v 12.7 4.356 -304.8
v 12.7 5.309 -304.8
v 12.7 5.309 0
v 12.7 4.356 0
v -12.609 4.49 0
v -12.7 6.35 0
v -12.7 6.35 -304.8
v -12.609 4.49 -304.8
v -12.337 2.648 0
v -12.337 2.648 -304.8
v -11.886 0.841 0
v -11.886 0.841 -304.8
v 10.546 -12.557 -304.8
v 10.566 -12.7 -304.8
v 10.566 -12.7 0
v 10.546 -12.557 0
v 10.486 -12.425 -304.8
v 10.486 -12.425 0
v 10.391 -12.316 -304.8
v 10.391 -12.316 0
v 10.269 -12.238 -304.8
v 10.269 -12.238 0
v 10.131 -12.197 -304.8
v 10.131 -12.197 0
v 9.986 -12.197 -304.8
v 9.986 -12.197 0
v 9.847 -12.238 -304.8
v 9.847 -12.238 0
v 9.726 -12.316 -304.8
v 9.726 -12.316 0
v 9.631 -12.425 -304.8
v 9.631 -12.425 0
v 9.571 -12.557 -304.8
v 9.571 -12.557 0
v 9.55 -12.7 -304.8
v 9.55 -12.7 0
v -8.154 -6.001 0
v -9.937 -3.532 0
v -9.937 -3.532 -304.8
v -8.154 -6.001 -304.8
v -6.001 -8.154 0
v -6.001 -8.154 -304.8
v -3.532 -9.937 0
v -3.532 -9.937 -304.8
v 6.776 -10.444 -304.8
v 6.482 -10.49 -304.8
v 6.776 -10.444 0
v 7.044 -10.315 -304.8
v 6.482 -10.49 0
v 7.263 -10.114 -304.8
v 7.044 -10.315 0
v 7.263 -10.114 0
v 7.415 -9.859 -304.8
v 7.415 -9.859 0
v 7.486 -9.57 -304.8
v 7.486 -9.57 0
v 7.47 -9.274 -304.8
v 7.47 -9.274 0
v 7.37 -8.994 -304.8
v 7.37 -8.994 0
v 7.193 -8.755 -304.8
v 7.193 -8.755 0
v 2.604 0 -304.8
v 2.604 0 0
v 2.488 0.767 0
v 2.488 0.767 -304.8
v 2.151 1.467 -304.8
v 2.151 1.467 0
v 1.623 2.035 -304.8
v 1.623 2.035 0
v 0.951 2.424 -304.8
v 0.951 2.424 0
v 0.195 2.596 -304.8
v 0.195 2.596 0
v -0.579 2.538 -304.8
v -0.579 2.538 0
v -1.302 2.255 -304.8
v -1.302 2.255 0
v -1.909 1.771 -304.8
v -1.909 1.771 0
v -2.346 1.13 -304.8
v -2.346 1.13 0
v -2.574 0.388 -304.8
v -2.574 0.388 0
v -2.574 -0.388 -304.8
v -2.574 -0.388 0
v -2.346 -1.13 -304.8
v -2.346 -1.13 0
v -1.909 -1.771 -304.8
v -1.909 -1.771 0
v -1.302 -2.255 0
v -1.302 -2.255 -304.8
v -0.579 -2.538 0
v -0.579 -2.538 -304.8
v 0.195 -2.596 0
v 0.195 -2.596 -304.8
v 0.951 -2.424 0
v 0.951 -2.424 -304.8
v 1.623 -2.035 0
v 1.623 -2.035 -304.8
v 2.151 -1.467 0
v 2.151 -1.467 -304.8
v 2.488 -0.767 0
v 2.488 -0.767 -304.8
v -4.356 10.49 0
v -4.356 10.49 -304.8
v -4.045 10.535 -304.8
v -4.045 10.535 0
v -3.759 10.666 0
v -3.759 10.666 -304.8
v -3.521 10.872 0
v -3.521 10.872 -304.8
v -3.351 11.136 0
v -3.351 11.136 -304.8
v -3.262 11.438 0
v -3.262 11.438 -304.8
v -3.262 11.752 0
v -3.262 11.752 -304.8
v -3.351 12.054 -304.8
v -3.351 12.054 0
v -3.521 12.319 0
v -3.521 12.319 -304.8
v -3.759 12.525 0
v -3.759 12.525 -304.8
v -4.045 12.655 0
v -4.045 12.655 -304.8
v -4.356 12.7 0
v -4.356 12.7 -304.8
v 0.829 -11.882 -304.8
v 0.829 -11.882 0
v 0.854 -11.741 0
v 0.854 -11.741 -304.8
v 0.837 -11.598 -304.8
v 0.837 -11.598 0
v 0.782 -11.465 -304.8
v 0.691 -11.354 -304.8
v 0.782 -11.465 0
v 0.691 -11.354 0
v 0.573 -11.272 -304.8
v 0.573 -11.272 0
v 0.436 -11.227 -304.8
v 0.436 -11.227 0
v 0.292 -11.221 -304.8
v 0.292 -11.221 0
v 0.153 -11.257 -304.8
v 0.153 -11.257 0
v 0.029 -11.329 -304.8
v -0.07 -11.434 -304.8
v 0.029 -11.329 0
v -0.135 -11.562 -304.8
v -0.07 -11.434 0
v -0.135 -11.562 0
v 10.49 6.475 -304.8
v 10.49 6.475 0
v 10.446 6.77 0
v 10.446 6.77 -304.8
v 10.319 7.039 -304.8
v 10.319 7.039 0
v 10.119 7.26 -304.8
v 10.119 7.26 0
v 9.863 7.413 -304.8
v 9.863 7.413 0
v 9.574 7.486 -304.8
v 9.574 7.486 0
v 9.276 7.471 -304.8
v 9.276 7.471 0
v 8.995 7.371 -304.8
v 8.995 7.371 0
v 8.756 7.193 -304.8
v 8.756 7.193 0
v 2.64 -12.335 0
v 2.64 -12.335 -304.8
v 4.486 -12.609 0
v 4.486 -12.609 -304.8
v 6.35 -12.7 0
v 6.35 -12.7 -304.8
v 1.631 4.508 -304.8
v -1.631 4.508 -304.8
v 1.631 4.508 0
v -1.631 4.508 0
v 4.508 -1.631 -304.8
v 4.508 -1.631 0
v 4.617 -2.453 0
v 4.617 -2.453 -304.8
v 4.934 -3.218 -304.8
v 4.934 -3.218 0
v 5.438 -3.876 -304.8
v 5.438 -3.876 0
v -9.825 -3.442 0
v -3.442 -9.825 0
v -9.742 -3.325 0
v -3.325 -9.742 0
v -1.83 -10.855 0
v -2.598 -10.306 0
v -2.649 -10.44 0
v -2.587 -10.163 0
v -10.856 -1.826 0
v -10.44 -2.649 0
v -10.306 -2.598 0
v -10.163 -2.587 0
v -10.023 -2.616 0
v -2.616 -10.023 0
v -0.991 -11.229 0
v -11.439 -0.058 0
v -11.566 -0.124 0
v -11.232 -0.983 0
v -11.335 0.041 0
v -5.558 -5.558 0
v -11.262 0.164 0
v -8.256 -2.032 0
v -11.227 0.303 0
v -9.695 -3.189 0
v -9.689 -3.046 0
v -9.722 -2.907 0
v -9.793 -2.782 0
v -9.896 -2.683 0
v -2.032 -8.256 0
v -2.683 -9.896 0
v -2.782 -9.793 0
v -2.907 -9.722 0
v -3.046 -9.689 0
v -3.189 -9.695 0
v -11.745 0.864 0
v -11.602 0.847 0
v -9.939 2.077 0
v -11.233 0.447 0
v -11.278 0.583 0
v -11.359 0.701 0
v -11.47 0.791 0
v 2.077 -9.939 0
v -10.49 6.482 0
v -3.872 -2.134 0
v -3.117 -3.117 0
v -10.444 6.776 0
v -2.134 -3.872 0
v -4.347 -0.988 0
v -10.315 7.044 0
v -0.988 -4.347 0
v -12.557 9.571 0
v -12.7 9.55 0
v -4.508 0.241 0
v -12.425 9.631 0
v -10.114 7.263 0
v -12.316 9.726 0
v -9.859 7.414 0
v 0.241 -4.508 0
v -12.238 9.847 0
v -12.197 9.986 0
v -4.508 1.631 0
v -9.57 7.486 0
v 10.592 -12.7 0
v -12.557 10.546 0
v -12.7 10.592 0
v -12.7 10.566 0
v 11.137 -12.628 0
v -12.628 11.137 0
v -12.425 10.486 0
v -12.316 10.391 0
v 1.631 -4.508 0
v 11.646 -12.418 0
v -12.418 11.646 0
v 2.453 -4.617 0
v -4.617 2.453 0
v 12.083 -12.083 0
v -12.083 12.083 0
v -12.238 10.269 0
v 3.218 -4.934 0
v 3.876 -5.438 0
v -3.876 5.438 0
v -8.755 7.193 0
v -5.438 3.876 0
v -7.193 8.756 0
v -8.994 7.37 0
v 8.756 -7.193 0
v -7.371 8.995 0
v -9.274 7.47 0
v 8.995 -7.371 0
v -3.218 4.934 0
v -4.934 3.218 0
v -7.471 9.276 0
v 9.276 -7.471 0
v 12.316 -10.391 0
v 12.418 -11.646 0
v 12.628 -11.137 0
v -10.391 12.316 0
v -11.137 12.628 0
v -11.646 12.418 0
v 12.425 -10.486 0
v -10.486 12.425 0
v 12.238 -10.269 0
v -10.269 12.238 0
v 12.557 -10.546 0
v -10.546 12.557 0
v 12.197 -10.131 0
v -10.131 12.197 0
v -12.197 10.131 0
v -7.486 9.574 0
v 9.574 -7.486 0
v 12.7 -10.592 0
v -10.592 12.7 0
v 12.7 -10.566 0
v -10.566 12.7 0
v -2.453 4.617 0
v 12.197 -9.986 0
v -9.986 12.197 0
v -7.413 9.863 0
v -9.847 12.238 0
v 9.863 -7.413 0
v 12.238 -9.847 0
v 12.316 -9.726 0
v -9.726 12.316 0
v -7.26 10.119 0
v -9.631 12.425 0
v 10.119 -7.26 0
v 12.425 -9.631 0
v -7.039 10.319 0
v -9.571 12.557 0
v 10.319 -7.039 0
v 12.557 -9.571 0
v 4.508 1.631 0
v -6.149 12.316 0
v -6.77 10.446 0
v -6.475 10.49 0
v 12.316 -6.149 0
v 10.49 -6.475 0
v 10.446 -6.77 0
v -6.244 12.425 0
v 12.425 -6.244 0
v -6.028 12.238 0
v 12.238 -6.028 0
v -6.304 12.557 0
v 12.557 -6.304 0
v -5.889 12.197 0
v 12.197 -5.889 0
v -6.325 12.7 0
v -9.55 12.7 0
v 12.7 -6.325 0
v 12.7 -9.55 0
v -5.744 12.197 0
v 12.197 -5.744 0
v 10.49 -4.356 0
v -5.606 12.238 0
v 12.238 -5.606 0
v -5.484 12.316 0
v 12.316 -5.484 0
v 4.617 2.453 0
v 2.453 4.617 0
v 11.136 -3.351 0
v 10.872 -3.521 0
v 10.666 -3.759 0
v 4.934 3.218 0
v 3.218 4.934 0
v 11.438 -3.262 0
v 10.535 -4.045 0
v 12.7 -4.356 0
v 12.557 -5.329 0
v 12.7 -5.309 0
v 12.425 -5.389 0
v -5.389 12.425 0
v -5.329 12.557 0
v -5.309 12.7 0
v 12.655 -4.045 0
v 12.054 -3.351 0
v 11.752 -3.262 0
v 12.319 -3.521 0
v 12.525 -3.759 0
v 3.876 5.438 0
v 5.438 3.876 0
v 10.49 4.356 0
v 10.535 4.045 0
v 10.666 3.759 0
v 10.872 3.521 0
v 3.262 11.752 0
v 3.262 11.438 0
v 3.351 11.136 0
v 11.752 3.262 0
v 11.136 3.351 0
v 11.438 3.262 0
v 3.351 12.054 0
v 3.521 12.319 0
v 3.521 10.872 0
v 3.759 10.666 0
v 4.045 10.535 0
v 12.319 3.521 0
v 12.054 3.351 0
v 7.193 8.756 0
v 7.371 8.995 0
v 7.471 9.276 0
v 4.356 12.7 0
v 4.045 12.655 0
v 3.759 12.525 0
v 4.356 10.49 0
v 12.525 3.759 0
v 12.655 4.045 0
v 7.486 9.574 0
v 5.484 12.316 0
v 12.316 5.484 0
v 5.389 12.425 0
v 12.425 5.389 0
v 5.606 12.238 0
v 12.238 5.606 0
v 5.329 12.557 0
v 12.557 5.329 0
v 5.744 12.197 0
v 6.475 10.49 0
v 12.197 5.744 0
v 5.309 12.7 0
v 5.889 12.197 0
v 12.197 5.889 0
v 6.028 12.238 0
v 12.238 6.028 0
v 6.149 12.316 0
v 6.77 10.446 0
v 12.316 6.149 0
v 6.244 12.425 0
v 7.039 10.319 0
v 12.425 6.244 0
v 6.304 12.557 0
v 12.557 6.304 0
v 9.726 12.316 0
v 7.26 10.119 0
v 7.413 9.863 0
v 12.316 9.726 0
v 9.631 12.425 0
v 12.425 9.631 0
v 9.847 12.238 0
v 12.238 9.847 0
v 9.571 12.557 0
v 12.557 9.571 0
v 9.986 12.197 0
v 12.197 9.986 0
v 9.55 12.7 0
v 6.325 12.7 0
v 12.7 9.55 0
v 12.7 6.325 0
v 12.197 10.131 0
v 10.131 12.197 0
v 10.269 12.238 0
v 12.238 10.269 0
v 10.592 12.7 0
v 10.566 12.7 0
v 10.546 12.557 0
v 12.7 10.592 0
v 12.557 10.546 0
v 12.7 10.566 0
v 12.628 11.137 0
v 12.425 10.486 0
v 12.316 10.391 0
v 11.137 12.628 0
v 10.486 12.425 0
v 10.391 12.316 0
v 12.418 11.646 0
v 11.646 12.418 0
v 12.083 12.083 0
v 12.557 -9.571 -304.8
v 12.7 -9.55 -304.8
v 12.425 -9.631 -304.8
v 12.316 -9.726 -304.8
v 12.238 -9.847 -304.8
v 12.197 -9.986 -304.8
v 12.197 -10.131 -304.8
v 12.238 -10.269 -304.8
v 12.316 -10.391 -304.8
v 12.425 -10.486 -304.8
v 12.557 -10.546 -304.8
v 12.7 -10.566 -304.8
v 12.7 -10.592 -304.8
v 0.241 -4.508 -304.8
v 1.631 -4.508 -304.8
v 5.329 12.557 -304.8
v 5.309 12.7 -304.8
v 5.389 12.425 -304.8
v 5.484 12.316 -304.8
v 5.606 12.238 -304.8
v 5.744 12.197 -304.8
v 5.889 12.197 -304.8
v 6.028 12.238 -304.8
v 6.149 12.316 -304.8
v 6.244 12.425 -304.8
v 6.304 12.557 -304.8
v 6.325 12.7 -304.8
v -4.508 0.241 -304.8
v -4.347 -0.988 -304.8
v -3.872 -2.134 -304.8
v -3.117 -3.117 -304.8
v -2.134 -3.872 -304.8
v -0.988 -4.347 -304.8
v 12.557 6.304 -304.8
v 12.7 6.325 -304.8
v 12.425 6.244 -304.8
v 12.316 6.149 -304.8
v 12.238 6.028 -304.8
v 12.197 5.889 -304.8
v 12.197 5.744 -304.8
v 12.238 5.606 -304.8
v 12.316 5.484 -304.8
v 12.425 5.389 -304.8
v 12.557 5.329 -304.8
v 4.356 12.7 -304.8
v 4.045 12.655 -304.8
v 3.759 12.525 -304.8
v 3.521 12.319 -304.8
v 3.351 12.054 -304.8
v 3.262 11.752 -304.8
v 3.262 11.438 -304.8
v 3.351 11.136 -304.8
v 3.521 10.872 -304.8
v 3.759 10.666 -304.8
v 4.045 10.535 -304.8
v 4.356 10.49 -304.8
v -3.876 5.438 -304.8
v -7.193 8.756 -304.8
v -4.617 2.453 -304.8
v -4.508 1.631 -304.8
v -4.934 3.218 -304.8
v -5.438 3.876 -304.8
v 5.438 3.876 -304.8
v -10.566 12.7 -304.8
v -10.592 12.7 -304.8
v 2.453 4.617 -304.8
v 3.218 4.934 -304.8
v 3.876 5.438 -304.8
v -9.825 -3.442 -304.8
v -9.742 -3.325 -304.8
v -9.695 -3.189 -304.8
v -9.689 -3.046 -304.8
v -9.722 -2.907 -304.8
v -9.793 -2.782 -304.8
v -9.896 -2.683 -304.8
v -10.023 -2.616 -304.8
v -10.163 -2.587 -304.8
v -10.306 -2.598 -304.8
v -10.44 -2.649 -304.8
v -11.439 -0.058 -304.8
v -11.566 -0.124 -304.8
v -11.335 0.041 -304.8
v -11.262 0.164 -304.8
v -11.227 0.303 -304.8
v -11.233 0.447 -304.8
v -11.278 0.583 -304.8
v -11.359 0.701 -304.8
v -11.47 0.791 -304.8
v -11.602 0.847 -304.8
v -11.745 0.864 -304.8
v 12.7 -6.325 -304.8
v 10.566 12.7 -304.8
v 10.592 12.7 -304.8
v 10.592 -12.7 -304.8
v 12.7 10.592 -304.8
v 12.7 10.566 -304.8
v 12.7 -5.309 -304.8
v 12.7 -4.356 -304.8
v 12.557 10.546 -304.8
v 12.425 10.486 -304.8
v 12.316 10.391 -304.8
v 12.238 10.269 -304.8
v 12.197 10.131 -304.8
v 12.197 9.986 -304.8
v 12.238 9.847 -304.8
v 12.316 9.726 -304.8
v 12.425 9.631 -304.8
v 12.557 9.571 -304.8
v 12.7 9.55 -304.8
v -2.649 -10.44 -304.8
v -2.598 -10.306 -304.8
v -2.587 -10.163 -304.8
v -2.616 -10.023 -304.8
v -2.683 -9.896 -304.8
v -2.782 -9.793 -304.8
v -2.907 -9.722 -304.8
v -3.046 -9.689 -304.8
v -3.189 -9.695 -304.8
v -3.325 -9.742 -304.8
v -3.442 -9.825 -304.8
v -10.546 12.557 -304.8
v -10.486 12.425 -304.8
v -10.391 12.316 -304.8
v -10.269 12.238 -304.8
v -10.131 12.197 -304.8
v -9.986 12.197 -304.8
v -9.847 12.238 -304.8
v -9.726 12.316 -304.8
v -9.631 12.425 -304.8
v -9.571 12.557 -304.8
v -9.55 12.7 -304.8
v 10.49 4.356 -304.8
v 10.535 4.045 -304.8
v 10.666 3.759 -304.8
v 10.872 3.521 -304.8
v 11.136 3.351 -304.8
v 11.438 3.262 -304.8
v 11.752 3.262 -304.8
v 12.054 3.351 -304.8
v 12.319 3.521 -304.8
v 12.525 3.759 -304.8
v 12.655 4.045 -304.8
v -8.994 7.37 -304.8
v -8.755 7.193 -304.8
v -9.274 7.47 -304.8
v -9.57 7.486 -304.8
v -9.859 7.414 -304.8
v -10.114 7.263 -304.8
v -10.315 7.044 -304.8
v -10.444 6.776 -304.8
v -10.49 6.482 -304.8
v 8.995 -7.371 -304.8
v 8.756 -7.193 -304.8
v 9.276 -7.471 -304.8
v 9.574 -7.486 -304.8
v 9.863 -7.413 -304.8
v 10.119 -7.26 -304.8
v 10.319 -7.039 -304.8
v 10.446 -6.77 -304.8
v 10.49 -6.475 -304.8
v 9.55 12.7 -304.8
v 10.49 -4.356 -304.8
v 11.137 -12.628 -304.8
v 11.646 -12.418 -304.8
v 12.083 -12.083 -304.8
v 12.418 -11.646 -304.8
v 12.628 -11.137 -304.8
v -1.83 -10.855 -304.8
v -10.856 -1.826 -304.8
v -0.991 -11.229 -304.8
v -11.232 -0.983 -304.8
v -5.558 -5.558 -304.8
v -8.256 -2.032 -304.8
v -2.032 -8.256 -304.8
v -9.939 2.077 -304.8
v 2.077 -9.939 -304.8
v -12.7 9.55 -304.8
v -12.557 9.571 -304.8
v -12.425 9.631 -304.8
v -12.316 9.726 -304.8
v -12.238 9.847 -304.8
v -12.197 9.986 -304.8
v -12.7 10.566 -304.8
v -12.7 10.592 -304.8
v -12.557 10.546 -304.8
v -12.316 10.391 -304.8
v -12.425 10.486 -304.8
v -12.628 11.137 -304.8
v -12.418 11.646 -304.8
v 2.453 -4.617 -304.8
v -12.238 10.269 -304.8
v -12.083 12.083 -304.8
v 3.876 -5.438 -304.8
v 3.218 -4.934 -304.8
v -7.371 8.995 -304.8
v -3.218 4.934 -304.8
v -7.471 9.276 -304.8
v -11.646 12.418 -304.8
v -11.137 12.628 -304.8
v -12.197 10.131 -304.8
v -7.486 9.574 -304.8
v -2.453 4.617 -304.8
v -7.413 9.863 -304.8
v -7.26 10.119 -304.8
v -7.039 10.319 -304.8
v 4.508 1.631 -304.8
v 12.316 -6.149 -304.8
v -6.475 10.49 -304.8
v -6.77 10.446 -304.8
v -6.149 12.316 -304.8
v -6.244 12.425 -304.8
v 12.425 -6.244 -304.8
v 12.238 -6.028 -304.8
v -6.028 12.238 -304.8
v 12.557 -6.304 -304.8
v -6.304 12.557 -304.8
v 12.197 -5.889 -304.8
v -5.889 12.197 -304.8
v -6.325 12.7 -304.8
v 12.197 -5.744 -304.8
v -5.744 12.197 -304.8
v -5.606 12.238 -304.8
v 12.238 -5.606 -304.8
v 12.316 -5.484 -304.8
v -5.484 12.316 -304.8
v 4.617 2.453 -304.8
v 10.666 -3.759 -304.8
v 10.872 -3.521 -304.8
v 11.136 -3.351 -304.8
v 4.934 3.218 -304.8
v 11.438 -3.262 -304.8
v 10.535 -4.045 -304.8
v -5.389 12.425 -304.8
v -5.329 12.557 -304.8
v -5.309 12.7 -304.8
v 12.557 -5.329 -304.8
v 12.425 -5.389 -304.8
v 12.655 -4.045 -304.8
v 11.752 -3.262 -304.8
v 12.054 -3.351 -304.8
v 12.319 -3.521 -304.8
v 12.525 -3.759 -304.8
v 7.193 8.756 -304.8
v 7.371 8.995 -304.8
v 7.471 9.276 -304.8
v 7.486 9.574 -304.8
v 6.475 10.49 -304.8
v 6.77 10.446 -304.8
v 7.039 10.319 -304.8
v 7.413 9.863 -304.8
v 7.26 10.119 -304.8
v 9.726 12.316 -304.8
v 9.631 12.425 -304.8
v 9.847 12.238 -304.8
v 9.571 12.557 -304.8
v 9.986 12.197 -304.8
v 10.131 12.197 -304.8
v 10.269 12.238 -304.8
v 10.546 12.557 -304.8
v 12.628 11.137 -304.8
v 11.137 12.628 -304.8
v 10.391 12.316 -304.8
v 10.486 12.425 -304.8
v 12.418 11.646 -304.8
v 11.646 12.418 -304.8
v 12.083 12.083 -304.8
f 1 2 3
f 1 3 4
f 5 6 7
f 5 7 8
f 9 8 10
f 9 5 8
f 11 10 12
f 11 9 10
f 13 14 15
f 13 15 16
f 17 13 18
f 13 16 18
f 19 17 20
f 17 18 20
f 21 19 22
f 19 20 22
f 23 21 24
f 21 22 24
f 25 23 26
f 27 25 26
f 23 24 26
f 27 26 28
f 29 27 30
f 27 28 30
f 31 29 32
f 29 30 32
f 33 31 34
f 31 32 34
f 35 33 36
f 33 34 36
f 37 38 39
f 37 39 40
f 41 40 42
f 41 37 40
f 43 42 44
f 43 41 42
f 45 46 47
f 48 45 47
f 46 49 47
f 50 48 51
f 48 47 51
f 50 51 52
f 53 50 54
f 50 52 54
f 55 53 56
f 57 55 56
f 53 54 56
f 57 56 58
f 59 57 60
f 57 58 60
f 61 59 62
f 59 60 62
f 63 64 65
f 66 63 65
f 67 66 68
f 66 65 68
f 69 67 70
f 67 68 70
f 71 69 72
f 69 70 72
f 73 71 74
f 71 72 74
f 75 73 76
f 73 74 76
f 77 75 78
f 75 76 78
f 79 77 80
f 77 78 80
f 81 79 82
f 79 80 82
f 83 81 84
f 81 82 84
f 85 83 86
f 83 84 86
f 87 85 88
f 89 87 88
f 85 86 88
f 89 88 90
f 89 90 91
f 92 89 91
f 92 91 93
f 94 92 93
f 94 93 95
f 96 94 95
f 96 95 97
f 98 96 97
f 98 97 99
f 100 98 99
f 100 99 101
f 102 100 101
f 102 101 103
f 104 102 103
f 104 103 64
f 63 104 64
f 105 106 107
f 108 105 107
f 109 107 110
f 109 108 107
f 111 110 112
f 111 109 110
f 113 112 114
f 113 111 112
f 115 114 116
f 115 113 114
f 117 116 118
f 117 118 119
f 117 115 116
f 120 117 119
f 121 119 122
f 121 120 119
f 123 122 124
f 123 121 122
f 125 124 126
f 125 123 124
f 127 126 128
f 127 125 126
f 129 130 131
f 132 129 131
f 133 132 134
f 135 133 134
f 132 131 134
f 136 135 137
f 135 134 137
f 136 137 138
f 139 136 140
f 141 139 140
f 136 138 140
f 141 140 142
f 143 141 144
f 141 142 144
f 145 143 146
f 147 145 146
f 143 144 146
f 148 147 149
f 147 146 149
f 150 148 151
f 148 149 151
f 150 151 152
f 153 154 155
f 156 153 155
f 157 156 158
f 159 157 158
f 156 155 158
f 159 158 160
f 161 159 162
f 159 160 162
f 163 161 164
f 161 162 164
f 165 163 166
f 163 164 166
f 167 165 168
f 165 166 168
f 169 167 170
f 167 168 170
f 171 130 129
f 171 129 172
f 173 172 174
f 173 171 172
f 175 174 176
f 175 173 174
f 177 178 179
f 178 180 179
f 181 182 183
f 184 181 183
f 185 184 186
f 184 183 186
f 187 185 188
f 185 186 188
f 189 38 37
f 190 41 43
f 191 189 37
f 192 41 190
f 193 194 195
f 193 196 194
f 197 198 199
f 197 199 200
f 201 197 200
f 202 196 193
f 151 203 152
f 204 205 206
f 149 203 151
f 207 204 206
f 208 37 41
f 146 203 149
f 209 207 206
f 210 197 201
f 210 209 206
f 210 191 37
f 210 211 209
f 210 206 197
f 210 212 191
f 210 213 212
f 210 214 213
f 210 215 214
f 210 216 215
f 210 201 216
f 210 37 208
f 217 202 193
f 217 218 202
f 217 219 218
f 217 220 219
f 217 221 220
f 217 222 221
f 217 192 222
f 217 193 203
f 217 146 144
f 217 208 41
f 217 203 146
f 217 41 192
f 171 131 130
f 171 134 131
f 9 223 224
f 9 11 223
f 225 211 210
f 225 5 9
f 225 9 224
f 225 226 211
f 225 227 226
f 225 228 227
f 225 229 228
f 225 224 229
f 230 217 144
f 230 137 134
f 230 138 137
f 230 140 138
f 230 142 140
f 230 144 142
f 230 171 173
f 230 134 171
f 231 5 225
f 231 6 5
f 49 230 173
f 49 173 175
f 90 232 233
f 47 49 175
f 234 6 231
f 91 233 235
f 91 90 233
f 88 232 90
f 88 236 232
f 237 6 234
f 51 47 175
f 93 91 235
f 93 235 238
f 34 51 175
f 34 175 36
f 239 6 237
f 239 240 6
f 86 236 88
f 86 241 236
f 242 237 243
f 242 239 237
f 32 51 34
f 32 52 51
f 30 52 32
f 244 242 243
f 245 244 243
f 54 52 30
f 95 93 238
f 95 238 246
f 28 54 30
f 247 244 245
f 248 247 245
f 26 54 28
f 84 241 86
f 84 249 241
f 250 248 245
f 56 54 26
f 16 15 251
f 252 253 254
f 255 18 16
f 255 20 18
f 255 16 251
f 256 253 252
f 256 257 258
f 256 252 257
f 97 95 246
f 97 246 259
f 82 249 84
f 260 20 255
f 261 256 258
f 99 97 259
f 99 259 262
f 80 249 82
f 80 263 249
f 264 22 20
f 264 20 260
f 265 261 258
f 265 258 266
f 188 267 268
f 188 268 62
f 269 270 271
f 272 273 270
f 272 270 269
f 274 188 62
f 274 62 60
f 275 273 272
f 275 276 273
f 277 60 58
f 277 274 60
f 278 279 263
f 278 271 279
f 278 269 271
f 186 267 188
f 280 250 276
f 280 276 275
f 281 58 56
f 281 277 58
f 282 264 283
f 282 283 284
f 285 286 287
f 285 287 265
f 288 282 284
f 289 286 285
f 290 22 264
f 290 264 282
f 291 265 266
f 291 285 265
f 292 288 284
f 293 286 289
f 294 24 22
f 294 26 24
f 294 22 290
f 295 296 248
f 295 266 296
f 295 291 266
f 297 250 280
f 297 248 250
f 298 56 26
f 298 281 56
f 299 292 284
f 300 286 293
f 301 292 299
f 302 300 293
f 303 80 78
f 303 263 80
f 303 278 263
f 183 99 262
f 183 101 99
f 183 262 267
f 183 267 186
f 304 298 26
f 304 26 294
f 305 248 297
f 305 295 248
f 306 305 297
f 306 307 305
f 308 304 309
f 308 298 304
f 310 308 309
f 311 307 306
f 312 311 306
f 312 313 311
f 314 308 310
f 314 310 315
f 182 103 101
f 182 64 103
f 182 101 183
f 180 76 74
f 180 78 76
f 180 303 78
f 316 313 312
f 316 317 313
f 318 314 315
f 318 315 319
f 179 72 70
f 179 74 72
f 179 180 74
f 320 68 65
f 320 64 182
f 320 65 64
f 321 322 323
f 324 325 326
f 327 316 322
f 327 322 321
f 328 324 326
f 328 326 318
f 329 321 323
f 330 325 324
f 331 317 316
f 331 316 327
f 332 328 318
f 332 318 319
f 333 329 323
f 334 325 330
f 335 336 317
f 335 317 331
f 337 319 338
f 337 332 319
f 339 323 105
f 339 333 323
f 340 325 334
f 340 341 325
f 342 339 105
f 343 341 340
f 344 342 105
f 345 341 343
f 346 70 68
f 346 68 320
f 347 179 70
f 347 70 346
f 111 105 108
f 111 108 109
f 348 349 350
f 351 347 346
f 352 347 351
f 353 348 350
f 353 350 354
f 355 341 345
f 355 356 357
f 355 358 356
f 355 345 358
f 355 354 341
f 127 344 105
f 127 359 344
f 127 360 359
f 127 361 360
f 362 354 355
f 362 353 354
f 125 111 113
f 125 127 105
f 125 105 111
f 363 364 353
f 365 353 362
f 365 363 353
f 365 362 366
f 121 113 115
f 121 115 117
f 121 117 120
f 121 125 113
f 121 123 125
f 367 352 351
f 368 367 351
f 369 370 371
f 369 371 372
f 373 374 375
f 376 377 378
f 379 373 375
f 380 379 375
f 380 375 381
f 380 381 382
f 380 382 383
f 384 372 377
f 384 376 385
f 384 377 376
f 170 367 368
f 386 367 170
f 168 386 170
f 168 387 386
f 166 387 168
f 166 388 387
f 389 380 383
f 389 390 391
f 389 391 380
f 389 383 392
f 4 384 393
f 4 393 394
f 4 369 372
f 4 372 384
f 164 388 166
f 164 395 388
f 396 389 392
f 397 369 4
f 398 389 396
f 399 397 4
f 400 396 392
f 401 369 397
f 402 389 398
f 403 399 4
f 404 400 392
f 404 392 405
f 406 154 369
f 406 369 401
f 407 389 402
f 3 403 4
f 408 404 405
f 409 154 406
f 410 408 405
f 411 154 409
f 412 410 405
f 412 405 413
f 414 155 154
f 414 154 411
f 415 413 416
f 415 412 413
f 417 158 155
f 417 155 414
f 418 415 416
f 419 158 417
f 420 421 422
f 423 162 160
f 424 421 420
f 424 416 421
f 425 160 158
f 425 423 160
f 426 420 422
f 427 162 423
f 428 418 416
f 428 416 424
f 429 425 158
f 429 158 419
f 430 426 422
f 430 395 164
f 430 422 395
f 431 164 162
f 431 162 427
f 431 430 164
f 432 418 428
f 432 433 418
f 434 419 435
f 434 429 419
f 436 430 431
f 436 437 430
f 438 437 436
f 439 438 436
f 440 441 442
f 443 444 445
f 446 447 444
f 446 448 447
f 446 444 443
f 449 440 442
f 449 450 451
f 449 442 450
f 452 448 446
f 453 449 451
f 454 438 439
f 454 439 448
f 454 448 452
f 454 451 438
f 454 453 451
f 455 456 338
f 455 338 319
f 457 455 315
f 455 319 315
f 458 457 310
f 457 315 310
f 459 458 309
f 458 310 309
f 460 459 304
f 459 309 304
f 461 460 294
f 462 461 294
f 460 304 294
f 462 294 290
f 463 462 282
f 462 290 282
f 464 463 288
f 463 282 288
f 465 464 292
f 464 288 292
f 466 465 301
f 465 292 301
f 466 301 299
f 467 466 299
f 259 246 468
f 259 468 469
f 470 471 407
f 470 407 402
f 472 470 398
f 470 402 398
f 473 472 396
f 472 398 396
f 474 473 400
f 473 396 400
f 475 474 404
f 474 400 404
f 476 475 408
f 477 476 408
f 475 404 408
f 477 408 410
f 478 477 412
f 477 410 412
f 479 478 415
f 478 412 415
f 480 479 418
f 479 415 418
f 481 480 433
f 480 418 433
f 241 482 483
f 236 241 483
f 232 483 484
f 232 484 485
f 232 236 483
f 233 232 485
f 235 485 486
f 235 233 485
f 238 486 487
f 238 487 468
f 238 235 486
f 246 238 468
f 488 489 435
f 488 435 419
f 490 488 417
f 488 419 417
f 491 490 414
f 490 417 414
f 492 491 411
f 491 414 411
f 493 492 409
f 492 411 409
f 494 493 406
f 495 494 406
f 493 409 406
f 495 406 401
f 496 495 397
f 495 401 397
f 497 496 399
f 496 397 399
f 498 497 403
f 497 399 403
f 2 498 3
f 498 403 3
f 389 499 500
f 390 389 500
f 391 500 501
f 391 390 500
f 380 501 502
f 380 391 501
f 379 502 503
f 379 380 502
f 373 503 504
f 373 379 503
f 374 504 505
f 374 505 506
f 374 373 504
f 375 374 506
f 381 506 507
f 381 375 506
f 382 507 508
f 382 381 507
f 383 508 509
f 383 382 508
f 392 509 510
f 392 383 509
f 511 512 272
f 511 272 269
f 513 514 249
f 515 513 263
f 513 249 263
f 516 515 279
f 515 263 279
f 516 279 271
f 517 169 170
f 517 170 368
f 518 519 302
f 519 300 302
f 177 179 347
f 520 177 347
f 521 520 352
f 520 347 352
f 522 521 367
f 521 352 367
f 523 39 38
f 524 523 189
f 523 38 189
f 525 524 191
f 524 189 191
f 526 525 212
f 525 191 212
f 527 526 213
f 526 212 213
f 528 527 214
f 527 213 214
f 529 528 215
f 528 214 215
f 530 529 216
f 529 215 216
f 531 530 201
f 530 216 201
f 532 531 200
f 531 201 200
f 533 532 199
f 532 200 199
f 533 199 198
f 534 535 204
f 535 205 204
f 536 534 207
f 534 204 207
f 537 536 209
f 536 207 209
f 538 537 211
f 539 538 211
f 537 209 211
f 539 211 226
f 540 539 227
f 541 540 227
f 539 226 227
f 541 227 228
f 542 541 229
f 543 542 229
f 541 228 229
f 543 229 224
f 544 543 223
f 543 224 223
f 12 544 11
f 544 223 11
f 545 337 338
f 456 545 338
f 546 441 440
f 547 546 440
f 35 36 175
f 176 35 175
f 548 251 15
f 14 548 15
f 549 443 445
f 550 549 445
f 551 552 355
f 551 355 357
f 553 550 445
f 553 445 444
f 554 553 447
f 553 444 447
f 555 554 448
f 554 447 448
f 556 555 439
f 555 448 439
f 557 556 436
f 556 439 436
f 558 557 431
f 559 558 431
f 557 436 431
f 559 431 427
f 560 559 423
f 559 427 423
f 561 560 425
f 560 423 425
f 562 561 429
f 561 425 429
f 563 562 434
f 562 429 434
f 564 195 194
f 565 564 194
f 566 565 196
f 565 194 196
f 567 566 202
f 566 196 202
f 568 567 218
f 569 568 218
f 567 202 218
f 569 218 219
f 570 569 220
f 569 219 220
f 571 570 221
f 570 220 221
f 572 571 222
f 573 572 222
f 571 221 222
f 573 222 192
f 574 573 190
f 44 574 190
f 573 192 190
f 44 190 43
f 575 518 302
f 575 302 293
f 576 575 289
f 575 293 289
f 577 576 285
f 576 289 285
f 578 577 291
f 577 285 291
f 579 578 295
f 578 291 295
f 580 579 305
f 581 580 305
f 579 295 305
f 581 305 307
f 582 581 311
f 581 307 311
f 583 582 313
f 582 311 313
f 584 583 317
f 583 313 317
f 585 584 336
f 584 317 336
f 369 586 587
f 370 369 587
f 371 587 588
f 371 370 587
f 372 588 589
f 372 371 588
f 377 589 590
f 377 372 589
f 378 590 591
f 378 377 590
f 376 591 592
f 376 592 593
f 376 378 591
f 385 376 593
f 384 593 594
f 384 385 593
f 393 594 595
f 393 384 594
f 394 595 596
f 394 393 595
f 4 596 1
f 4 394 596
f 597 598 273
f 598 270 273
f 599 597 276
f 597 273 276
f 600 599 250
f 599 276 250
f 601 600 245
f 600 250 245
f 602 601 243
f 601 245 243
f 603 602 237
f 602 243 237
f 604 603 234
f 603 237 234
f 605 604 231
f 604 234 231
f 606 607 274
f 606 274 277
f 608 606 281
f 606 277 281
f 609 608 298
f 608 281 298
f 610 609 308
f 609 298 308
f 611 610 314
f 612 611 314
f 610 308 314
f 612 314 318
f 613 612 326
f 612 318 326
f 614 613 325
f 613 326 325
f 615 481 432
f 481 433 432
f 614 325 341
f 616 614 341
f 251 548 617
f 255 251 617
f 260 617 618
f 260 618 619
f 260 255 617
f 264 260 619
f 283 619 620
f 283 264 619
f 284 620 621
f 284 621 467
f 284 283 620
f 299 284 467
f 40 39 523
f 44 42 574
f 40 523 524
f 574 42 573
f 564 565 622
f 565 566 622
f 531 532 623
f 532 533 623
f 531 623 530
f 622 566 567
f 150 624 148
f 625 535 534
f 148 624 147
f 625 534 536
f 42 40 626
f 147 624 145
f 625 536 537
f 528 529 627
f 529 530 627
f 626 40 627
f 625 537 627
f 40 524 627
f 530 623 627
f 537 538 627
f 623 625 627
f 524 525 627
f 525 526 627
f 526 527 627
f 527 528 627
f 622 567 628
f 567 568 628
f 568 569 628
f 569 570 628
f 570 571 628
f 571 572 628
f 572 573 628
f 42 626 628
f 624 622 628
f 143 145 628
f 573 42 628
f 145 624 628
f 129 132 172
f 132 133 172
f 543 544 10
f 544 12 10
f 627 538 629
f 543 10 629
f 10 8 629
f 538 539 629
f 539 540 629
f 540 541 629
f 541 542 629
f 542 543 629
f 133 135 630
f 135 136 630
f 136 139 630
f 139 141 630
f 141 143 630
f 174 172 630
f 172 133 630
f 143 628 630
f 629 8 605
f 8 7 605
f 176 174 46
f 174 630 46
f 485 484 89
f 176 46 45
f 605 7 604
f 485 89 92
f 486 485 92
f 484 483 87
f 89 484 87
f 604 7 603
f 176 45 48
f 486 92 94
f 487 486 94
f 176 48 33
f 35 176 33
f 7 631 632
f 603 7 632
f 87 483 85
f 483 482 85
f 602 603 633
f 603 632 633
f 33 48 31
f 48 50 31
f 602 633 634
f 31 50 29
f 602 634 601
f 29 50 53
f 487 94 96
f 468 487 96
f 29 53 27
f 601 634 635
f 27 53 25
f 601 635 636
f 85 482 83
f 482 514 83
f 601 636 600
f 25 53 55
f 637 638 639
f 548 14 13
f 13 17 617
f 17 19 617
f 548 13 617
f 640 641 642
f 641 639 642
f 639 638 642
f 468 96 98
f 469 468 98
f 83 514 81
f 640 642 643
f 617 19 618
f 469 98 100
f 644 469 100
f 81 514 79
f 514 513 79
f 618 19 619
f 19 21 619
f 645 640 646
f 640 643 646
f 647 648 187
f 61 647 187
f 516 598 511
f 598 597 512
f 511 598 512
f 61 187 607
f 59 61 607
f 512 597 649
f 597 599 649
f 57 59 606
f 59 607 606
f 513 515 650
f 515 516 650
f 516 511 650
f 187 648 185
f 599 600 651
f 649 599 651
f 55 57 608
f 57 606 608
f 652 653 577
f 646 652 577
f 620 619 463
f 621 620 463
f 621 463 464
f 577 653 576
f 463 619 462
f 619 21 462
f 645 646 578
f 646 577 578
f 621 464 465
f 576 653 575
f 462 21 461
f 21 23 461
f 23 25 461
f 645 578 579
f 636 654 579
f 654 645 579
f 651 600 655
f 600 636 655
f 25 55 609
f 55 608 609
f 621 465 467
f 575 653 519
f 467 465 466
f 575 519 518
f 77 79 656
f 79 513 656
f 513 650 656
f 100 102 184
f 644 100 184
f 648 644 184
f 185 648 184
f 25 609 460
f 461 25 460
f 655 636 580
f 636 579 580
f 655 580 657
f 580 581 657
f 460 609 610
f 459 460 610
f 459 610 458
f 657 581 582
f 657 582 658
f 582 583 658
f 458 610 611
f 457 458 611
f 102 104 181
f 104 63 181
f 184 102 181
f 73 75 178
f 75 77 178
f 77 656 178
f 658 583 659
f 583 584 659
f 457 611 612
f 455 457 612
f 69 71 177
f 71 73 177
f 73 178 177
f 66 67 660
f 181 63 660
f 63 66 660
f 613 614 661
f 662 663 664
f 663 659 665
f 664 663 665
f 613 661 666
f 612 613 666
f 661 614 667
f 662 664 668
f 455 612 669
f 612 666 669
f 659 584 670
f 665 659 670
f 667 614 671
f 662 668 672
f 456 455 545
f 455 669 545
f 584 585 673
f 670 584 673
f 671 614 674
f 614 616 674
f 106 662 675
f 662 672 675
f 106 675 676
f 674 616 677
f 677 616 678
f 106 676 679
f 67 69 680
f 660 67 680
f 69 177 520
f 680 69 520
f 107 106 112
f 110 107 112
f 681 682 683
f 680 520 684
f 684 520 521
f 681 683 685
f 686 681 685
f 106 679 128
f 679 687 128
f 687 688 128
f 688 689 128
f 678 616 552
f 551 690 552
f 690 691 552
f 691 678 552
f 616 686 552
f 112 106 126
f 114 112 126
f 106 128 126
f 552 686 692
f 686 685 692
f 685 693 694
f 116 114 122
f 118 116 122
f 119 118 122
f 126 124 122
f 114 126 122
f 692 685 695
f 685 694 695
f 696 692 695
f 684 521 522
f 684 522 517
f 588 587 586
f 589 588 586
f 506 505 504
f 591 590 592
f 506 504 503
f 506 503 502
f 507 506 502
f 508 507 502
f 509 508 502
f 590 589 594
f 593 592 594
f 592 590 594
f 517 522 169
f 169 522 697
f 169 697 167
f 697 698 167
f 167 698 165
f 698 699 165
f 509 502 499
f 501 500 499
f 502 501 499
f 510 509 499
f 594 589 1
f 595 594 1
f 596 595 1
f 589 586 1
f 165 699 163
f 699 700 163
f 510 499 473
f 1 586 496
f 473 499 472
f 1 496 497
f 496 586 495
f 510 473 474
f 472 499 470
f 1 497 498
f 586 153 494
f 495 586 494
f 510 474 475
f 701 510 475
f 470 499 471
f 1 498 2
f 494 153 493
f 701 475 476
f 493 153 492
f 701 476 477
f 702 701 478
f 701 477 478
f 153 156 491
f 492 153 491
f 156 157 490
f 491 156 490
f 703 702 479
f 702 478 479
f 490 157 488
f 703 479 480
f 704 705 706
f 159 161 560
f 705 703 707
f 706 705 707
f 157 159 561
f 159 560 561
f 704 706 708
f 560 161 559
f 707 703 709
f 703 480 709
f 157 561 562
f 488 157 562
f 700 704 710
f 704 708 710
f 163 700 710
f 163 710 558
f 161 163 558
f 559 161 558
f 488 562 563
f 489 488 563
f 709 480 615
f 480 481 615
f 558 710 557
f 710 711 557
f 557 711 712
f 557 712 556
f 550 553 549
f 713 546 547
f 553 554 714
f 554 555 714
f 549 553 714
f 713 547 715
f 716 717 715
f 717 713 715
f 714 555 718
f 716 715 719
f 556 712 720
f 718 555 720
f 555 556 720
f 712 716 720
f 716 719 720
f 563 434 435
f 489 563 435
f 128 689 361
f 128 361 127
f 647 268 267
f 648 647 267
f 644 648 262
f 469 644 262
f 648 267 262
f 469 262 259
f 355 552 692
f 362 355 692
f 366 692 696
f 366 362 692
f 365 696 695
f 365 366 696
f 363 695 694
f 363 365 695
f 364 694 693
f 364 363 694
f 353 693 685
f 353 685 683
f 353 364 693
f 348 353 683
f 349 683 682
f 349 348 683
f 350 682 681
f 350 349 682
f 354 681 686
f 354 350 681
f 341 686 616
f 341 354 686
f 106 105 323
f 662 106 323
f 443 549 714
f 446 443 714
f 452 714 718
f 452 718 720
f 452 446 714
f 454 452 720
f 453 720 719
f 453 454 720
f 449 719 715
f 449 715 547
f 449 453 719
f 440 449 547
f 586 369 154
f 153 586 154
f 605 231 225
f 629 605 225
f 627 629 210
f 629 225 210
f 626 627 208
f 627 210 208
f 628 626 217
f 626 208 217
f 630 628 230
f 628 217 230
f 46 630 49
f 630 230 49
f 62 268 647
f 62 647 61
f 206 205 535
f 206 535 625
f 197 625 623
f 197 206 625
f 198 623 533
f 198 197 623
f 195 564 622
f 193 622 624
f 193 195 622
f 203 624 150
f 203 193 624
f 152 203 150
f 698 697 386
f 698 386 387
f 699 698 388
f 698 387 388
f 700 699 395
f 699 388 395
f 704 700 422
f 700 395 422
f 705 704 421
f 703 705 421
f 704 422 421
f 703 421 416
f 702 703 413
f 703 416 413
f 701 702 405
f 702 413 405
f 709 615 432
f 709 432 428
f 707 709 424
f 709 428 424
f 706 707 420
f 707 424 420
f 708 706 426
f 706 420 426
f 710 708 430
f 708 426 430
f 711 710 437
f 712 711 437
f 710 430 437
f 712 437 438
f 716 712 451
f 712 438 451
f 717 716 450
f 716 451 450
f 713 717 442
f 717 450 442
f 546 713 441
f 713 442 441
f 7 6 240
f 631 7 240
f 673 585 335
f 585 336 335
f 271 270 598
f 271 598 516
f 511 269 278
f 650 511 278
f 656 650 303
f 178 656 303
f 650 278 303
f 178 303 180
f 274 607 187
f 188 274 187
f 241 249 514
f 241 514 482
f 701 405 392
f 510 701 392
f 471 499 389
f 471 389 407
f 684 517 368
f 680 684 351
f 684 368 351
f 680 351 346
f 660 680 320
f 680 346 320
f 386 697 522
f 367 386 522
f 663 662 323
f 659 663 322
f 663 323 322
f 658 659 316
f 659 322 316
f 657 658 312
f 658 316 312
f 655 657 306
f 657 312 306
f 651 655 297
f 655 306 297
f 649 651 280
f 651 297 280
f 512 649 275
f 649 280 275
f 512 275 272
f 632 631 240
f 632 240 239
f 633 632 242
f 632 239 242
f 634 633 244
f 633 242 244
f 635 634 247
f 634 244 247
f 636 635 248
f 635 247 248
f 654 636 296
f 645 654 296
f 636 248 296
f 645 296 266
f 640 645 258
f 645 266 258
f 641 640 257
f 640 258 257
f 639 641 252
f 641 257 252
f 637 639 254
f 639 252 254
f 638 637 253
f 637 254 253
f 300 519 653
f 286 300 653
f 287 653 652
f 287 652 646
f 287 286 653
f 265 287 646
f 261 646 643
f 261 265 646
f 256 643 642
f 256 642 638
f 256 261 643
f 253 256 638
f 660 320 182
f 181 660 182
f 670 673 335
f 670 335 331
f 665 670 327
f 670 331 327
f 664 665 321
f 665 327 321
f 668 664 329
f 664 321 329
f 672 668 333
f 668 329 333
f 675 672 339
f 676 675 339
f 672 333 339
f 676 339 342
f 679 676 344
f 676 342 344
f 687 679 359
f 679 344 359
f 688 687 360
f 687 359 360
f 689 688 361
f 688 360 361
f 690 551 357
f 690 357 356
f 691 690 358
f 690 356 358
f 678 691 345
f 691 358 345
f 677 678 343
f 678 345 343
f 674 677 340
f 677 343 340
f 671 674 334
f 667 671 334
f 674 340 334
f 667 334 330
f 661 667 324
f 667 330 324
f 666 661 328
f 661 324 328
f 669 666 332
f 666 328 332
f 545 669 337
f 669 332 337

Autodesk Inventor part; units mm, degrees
ref_plane "YZ Plane" through (0, 0, 0) normal (1, 0, 0) x (0, 1, 0)
ref_plane "XZ Plane" through (0, 0, 0) normal (0, 1, 0) x (-1, 0, 0)
ref_plane "XY Plane" through (0, 0, 0) normal (0, 0, 1) x (1, 0, 0)
sketch "Sketch1" plane through (0, 0, 0) normal (0, 0, 1) x (1, 0, 0)
  arc A0 (-11.5663, -0.1236) -> (-11.886, 0.8407) centre (-11.7326, 0.3564) ccw
  arc A1 (-11.5663, -0.1236) -> (-10.4403, -2.6494) centre (6.35, 6.35) ccw
  arc A2 (-12.7, 6.35) -> (-11.886, 0.8407) centre (6.35, 6.35) ccw
  arc A3 (-9.9367, -3.5317) -> (-10.4403, -2.6494) centre (-10.1943, -3.0939) ccw
  line L0 (-12.7, 6.35) -> (-12.7, 9.5504)
  arc A4 (-9.9367, -3.5317) -> (-3.5317, -9.9367) centre (6.35, 6.35) ccw
  arc A5 (-12.7, 9.5504) -> (-12.7, 10.5664) centre (-12.7, 10.0584) ccw
  arc A6 (-2.6494, -10.4403) -> (-3.5317, -9.9367) centre (-3.0939, -10.1943) ccw
  line L1 (-12.7, 10.5664) -> (-12.7, 10.5918)
  arc A7 (-2.6494, -10.4403) -> (-0.1348, -11.5623) centre (6.35, 6.35) ccw
  arc A8 (-10.5918, 12.7) -> (-12.7, 10.5918) centre (-10.5918, 10.5918) ccw
  arc A9 (0.8294, -11.8825) -> (-0.1348, -11.5623) centre (0.3459, -11.7266) ccw
  line L2 (-10.5918, 12.7) -> (-10.5664, 12.7)
  arc A10 (0.8294, -11.8825) -> (6.35, -12.7) centre (6.35, 6.35) ccw
  arc A11 (-10.5664, 12.7) -> (-9.5504, 12.7) centre (-10.0584, 12.7) ccw
  line L3 (9.5504, -12.7) -> (6.35, -12.7)
  line L4 (-9.5504, 12.7) -> (-6.3246, 12.7)
  arc A12 (10.5664, -12.7) -> (9.5504, -12.7) centre (10.0584, -12.7) ccw
  arc A13 (-6.3246, 12.7) -> (-5.3086, 12.7) centre (-5.8166, 12.7) ccw
  line L5 (10.5918, -12.7) -> (10.5664, -12.7)
  line L6 (-5.3086, 12.7) -> (-4.3561, 12.7)
  arc A14 (10.5918, -12.7) -> (12.7, -10.5918) centre (10.5918, -10.5918) ccw
  arc A15 (-4.3561, 10.4902) -> (-4.3561, 12.7) centre (-4.3561, 11.5951) ccw
  line L7 (12.7, -10.5664) -> (12.7, -10.5918)
  line L8 (-4.3561, 10.4902) -> (-6.4748, 10.4902)
  arc A16 (12.7, -9.5504) -> (12.7, -10.5664) centre (12.7, -10.0584) ccw
  arc A17 (-6.4748, 10.4902) -> (-7.1932, 8.7558) centre (-6.4748, 9.4742) ccw
  line L9 (12.7, -6.3246) -> (12.7, -9.5504)
  line L10 (-7.1932, 8.7558) -> (-3.8759, 5.4384)
  arc A18 (12.7, -5.3086) -> (12.7, -6.3246) centre (12.7, -5.8166) ccw
  arc A19 (-3.8759, 5.4384) -> (-1.6308, 4.5085) centre (-1.6308, 7.6835) ccw
  line L11 (12.7, -4.3561) -> (12.7, -5.3086)
  line L12 (-1.6308, 4.5085) -> (1.6308, 4.5085)
  arc A20 (12.7, -4.3561) -> (10.4902, -4.3561) centre (11.5951, -4.3561) ccw
  arc A21 (1.6308, 4.5085) -> (3.8759, 5.4384) centre (1.6308, 7.6835) ccw
  line L13 (10.4902, -6.4748) -> (10.4902, -4.3561)
  line L14 (7.1932, 8.7558) -> (3.8759, 5.4384)
  arc A22 (8.7558, -7.1932) -> (10.4902, -6.4748) centre (9.4742, -6.4748) ccw
  arc A23 (7.1932, 8.7558) -> (6.4748, 10.4902) centre (6.4748, 9.4742) ccw
  line L15 (8.7558, -7.1932) -> (5.4384, -3.8759)
  line L16 (6.4748, 10.4902) -> (4.3561, 10.4902)
  arc A24 (4.5085, -1.6308) -> (5.4384, -3.8759) centre (7.6835, -1.6308) ccw
  arc A25 (4.3561, 12.7) -> (4.3561, 10.4902) centre (4.3561, 11.5951) ccw
  line L17 (4.5085, 1.6308) -> (4.5085, -1.6308)
  line L18 (4.3561, 12.7) -> (5.3086, 12.7)
  arc A26 (5.4384, 3.8759) -> (4.5085, 1.6308) centre (7.6835, 1.6308) ccw
  arc A27 (5.3086, 12.7) -> (6.3246, 12.7) centre (5.8166, 12.7) ccw
  line L19 (8.7558, 7.1932) -> (5.4384, 3.8759)
  line L20 (6.3246, 12.7) -> (9.5504, 12.7)
  arc A28 (10.4902, 6.4748) -> (8.7558, 7.1932) centre (9.4742, 6.4748) ccw
  arc A29 (9.5504, 12.7) -> (10.5664, 12.7) centre (10.0584, 12.7) ccw
  line L21 (10.4902, 4.3561) -> (10.4902, 6.4748)
  line L22 (10.5664, 12.7) -> (10.5918, 12.7)
  arc A30 (10.4902, 4.3561) -> (12.7, 4.3561) centre (11.5951, 4.3561) ccw
  arc A31 (12.7, 10.5918) -> (10.5918, 12.7) centre (10.5918, 10.5918) ccw
  line L23 (12.7, 5.3086) -> (12.7, 4.3561)
  line L24 (12.7, 10.5918) -> (12.7, 10.5664)
  arc A32 (12.7, 6.3246) -> (12.7, 5.3086) centre (12.7, 5.8166) ccw
  arc A33 (12.7, 10.5664) -> (12.7, 9.5504) centre (12.7, 10.0584) ccw
  line L25 (12.7, 9.5504) -> (12.7, 6.3246)
  arc A34 (-4.5085, 0.2413) -> (0.2413, -4.5085) centre (0.2413, 0.2413) ccw
  line L26 (0.2413, -4.5085) -> (1.6308, -4.5085)
  line L27 (-4.5085, 1.6308) -> (-4.5085, 0.2413)
  arc A35 (3.8759, -5.4384) -> (1.6308, -4.5085) centre (1.6308, -7.6835) ccw
  arc A36 (-4.5085, 1.6308) -> (-5.4384, 3.8759) centre (-7.6835, 1.6308) ccw
  line L28 (3.8759, -5.4384) -> (7.1927, -8.7553)
  line L29 (-8.7553, 7.1927) -> (-5.4384, 3.8759)
  arc A37 (6.4823, -10.4897) -> (7.1927, -8.7553) centre (6.4743, -9.4737) ccw
  arc A38 (-8.7553, 7.1927) -> (-10.4897, 6.4823) centre (-9.4737, 6.4743) ccw
  arc A39 (-10.4897, 6.4823) -> (6.4823, -10.4897) centre (6.35, 6.35) ccw
  circle A40 centre (0, 0) radius 2.6035
extrude "Extrusion1" add sketch "Sketch1" against normal blind 304.8
properties part number "1012"
